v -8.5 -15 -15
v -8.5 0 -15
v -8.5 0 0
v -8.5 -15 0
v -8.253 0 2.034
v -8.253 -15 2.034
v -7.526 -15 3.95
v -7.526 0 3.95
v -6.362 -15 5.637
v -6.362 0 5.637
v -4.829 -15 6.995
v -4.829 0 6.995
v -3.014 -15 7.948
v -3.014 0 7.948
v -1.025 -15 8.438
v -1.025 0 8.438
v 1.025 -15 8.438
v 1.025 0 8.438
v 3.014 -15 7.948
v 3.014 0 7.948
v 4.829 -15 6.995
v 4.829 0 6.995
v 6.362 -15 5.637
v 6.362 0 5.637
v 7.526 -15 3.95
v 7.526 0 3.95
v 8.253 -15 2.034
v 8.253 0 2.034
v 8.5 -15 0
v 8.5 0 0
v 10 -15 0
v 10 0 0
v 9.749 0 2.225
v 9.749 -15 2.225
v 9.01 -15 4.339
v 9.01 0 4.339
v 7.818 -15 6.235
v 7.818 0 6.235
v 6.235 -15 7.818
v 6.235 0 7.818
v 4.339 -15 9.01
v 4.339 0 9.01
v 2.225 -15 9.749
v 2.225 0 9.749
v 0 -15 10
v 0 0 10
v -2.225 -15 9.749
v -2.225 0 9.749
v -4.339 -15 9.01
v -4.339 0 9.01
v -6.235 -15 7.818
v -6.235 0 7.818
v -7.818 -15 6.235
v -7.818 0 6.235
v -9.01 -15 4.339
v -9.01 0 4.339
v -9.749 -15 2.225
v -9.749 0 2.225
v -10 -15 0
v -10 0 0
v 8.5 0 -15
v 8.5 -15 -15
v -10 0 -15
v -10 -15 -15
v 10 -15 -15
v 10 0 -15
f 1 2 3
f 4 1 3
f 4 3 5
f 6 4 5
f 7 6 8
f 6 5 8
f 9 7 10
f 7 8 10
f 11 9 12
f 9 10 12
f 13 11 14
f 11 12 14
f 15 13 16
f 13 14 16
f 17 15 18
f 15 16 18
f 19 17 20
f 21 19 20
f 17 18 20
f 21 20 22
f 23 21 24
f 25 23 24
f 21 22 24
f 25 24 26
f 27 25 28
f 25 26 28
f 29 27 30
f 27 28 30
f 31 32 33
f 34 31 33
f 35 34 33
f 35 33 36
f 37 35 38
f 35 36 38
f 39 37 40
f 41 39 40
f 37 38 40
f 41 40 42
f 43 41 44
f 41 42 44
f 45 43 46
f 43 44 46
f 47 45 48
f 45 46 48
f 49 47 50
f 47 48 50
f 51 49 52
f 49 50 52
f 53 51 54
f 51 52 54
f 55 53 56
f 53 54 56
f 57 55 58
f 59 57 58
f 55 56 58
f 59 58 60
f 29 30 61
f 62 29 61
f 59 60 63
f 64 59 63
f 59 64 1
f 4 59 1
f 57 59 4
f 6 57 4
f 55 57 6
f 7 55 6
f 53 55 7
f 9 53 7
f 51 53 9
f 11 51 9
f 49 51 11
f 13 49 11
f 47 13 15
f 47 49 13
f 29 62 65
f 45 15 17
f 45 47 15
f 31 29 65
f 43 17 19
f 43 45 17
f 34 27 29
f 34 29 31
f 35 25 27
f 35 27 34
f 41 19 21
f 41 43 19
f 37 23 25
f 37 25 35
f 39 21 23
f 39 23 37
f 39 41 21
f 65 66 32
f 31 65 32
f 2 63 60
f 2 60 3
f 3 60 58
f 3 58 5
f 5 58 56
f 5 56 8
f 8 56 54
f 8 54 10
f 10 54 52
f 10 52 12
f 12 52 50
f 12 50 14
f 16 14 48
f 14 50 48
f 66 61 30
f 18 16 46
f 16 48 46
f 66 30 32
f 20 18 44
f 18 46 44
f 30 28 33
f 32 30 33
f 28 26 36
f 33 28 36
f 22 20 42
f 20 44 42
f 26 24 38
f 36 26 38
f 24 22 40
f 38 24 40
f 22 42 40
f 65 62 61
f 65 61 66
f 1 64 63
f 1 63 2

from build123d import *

# Parameters (mm, degrees)
F1_DEPTH = 15


with BuildPart() as f1:
    # F0 (on Front) → F1 (new body)
    with BuildSketch(Plane.XZ):
        with BuildLine():
            Line((10, -15), (10, 0))
            ThreePointArc((10, 0), (0, 10), (-10, 0))
            Line((-10, 0), (-10, -15))
            Line((-10, -15), (-8.5, -15))
            Line((-8.5, -15), (-8.5, 0))
            ThreePointArc((-8.5, 0), (0, 8.5), (8.5, 0))
            Line((8.5, 0), (8.5, -15))
            Line((8.5, -15), (10, -15))
        make_face()
    extrude(amount=F1_DEPTH)


solid = f1.part
